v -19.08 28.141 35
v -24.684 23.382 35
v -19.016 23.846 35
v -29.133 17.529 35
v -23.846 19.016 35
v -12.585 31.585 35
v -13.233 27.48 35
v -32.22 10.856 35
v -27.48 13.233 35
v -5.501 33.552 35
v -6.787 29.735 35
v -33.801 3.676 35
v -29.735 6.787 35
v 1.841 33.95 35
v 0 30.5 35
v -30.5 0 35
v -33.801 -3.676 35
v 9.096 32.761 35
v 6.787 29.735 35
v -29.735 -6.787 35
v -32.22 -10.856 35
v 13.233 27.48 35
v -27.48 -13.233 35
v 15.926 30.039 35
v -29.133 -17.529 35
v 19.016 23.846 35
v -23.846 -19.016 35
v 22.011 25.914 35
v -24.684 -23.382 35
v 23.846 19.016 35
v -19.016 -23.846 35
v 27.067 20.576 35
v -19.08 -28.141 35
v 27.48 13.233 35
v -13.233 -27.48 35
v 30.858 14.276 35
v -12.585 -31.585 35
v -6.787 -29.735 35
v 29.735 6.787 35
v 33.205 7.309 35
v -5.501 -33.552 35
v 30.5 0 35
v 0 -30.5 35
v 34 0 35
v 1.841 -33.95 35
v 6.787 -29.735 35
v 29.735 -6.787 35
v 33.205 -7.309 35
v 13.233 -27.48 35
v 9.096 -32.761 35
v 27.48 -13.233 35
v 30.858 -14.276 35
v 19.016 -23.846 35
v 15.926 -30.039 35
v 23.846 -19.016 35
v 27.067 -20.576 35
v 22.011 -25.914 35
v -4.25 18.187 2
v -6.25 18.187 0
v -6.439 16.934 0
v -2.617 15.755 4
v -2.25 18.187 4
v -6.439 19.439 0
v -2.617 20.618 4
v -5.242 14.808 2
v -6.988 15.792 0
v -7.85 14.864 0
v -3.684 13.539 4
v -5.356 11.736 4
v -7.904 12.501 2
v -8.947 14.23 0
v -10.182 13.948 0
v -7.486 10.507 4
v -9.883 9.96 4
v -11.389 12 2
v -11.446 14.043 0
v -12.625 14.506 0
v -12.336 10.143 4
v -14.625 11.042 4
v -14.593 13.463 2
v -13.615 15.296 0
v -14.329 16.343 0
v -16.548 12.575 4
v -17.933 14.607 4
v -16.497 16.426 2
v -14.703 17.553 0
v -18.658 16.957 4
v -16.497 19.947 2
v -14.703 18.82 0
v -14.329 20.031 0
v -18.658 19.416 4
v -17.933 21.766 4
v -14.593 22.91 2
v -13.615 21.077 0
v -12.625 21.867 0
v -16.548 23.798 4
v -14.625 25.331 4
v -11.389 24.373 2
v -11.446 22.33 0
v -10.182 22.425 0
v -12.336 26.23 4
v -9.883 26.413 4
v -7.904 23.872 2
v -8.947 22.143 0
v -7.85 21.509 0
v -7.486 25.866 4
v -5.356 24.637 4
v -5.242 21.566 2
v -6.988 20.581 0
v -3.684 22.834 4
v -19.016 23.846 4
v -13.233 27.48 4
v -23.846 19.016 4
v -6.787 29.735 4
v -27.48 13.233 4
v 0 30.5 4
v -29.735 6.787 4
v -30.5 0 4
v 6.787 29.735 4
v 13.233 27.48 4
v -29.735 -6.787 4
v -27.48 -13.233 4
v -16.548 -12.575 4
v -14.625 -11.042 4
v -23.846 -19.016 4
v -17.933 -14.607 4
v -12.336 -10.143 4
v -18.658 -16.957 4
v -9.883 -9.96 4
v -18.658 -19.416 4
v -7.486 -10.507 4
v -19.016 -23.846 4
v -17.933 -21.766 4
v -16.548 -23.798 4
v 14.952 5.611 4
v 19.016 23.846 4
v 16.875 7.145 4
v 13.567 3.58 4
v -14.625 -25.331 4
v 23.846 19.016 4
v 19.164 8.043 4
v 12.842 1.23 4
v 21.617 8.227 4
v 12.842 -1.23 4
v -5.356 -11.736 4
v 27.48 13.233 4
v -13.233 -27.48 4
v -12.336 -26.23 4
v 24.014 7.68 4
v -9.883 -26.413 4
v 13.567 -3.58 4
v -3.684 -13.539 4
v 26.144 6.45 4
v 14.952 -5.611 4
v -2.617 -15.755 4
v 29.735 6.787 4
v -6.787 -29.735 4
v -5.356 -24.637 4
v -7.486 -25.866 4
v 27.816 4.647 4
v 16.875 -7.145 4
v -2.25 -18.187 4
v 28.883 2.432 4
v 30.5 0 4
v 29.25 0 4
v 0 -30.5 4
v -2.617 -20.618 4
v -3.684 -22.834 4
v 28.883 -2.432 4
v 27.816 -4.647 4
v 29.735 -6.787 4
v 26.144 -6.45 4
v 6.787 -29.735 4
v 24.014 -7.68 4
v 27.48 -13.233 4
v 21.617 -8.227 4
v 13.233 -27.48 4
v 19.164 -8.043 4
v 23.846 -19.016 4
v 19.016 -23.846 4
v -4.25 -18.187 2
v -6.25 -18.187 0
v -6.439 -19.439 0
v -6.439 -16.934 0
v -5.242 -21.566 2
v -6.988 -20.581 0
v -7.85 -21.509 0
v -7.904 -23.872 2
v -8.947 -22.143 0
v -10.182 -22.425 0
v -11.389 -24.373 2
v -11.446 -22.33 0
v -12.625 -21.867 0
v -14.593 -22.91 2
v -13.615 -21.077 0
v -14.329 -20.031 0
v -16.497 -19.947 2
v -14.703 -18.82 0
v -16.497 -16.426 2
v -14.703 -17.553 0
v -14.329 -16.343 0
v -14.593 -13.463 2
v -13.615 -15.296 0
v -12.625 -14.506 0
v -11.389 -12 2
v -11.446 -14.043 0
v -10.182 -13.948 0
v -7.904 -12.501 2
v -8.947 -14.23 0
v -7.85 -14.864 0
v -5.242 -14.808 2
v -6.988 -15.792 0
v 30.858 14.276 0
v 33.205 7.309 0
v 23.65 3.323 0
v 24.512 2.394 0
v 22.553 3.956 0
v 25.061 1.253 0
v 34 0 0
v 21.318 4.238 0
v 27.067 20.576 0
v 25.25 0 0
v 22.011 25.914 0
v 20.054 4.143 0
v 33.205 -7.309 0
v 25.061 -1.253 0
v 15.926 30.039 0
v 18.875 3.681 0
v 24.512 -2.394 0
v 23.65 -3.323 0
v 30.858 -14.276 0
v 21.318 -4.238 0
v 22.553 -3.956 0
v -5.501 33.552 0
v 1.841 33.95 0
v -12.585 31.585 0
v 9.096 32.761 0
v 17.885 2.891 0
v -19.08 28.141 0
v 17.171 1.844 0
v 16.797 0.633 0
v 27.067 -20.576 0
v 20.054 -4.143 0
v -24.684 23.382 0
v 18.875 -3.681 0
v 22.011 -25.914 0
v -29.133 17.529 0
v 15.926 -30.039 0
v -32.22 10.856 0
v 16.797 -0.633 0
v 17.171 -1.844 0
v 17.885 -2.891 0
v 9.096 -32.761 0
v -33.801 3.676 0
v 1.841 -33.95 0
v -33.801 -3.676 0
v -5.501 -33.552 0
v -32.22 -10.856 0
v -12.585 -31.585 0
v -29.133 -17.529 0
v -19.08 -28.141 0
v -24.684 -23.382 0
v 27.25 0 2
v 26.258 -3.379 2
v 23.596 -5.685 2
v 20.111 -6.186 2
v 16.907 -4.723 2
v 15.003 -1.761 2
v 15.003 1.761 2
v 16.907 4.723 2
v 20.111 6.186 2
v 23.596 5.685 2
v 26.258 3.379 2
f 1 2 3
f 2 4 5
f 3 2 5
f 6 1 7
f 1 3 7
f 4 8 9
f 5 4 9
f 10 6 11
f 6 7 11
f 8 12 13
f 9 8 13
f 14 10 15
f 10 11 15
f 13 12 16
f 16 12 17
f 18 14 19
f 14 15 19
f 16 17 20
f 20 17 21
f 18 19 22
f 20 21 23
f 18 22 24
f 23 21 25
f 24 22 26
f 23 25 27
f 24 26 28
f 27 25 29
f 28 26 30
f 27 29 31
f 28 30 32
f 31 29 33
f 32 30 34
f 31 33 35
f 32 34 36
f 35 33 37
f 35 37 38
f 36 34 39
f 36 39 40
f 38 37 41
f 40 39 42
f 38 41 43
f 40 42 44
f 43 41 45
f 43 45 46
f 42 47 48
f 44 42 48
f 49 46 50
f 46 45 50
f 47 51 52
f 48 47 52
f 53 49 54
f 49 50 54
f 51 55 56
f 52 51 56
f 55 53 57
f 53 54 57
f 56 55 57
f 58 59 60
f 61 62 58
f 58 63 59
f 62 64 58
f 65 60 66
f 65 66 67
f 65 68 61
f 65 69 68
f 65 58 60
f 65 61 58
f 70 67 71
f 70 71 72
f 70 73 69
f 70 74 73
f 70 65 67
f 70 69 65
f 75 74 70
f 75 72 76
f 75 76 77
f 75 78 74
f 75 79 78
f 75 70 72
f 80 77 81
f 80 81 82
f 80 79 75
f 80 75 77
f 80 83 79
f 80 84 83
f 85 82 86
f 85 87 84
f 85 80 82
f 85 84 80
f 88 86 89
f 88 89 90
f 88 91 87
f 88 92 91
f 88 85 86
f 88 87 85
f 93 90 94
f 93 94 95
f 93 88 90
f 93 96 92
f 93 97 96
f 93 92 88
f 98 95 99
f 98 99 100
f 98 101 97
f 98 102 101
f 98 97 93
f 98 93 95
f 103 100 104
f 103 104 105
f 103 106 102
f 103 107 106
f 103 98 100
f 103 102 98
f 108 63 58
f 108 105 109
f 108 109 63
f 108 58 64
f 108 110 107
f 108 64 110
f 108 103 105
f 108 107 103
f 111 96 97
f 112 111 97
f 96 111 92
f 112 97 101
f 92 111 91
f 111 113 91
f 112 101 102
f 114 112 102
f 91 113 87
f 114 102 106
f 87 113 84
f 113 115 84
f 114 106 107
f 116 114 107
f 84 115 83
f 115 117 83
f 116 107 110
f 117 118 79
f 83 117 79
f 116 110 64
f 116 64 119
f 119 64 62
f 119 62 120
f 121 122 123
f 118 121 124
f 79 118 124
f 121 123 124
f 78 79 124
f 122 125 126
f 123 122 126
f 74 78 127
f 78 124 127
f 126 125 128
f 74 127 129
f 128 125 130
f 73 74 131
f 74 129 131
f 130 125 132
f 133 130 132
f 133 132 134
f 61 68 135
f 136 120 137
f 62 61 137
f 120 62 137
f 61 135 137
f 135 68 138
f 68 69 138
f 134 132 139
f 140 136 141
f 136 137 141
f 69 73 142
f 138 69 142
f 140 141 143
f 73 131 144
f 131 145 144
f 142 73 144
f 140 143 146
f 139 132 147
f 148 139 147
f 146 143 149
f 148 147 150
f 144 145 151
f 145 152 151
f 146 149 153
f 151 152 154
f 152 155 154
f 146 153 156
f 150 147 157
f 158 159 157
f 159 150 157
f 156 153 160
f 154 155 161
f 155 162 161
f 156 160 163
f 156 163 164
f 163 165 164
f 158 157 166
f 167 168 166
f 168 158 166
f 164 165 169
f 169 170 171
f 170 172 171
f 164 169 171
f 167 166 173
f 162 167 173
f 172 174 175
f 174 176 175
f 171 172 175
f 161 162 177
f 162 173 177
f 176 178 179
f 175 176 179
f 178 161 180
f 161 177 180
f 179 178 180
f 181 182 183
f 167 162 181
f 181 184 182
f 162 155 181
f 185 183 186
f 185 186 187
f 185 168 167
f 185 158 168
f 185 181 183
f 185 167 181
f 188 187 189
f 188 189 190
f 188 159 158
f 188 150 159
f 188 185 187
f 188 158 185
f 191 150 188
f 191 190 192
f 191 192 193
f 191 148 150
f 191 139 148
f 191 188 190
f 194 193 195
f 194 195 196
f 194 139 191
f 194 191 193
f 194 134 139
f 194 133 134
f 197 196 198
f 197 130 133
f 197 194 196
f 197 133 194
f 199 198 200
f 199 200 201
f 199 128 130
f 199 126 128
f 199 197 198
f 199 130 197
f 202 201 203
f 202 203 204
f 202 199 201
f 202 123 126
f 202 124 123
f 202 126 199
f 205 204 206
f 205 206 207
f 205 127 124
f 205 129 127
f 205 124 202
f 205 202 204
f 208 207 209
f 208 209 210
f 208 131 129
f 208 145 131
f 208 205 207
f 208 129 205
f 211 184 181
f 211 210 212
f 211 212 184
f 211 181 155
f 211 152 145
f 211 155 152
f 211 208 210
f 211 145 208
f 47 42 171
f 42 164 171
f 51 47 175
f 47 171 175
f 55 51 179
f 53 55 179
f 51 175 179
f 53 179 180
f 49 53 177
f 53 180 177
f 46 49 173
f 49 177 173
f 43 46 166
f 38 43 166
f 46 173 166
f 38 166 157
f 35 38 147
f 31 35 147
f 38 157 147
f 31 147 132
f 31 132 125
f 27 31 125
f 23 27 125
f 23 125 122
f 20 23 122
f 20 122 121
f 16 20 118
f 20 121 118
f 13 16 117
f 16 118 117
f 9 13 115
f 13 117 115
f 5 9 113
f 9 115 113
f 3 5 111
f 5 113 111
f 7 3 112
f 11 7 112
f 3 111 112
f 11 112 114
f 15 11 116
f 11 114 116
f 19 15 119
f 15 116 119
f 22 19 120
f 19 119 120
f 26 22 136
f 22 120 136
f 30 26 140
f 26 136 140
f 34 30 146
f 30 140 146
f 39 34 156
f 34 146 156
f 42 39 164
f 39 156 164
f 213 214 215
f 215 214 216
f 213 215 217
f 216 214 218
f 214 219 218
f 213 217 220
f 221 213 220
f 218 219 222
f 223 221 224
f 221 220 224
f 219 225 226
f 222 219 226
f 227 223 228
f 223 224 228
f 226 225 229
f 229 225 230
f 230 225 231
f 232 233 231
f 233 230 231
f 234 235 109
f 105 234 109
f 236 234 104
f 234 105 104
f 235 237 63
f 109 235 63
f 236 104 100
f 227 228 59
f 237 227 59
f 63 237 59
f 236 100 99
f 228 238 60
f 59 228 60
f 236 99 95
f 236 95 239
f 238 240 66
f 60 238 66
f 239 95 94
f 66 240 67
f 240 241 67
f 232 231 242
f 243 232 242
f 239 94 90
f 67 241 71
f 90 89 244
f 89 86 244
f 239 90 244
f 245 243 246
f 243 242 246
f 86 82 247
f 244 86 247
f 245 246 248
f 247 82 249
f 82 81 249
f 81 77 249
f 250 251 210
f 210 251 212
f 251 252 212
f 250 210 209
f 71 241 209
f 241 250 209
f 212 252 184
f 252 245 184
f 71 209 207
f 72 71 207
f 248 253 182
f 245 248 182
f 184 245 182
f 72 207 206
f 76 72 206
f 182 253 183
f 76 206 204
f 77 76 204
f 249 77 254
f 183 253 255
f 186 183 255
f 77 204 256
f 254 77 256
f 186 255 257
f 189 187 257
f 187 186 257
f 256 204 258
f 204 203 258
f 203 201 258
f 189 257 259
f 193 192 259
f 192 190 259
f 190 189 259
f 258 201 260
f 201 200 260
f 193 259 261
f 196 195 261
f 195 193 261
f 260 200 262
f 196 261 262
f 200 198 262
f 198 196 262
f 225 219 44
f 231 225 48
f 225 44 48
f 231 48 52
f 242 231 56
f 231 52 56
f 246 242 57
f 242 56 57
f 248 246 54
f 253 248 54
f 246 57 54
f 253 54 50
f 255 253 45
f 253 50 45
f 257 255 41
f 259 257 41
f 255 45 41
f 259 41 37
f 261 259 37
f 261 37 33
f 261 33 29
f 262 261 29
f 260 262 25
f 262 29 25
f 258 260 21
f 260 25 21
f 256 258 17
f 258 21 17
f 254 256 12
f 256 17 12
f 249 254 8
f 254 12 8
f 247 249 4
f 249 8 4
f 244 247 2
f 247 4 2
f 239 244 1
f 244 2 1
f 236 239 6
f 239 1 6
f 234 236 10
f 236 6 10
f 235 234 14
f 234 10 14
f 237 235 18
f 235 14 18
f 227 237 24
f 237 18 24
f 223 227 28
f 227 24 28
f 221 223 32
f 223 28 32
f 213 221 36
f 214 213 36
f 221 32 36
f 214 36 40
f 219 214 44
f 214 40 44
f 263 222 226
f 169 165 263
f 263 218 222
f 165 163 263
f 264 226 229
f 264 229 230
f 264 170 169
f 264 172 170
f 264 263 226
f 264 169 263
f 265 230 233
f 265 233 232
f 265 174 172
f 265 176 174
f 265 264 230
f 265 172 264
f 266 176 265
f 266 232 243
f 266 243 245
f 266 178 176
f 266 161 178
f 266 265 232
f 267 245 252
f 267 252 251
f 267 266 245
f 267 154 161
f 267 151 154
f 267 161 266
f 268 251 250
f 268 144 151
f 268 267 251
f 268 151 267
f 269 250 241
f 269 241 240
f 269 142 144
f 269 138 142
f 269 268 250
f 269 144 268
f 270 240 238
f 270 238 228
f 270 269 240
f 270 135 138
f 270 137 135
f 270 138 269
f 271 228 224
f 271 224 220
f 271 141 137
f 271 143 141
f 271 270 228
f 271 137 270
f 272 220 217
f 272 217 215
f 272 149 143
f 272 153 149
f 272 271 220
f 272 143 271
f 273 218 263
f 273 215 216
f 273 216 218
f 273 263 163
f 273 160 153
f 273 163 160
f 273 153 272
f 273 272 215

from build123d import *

# Parameters (mm, degrees)
F1_R     = 4.25
F3_DEPTH = 25
F4_SIZE  = 3.99999


# Not quite as in the source:
# - a fillet or chamfer is up to 0.001 mm smaller than in the source, because OpenCascade refuses the exact size


with BuildPart() as f2:
    # F0 (on Front) → F2 (revolve)
    with BuildSketch(Plane.XZ):
        Polygon((0, 4), (0, 0), (34, 0), (34, 35), (30.5, 35), (30.5, 4), align=None)
    revolve(axis=Axis((0, 0, 2), (0, 0, -1)))

    # F1 (on Top) → F3 (cut)
    with BuildSketch(Plane.XY):
        with Locations((-10.5, -18.1865334795)):
            Circle(F1_R)
        with Locations((-10.5, 18.1865334795)):
            Circle(F1_R)
        with Locations((21, 0)):
            Circle(F1_R)
    extrude(amount=F3_DEPTH, mode=Mode.SUBTRACT)

    # F4 (size 4 in the source; OpenCascade refuses exactly that, so slightly less here)
    f4_edges = [f2.edges().sort_by_distance(p)[0] for p in [
        (16.75, 0, 4),
        (-14.75, 18.186533, 4),
        (-14.75, -18.186533, 4),
    ]]
    chamfer(f4_edges, length=F4_SIZE)


solid = f2.part
